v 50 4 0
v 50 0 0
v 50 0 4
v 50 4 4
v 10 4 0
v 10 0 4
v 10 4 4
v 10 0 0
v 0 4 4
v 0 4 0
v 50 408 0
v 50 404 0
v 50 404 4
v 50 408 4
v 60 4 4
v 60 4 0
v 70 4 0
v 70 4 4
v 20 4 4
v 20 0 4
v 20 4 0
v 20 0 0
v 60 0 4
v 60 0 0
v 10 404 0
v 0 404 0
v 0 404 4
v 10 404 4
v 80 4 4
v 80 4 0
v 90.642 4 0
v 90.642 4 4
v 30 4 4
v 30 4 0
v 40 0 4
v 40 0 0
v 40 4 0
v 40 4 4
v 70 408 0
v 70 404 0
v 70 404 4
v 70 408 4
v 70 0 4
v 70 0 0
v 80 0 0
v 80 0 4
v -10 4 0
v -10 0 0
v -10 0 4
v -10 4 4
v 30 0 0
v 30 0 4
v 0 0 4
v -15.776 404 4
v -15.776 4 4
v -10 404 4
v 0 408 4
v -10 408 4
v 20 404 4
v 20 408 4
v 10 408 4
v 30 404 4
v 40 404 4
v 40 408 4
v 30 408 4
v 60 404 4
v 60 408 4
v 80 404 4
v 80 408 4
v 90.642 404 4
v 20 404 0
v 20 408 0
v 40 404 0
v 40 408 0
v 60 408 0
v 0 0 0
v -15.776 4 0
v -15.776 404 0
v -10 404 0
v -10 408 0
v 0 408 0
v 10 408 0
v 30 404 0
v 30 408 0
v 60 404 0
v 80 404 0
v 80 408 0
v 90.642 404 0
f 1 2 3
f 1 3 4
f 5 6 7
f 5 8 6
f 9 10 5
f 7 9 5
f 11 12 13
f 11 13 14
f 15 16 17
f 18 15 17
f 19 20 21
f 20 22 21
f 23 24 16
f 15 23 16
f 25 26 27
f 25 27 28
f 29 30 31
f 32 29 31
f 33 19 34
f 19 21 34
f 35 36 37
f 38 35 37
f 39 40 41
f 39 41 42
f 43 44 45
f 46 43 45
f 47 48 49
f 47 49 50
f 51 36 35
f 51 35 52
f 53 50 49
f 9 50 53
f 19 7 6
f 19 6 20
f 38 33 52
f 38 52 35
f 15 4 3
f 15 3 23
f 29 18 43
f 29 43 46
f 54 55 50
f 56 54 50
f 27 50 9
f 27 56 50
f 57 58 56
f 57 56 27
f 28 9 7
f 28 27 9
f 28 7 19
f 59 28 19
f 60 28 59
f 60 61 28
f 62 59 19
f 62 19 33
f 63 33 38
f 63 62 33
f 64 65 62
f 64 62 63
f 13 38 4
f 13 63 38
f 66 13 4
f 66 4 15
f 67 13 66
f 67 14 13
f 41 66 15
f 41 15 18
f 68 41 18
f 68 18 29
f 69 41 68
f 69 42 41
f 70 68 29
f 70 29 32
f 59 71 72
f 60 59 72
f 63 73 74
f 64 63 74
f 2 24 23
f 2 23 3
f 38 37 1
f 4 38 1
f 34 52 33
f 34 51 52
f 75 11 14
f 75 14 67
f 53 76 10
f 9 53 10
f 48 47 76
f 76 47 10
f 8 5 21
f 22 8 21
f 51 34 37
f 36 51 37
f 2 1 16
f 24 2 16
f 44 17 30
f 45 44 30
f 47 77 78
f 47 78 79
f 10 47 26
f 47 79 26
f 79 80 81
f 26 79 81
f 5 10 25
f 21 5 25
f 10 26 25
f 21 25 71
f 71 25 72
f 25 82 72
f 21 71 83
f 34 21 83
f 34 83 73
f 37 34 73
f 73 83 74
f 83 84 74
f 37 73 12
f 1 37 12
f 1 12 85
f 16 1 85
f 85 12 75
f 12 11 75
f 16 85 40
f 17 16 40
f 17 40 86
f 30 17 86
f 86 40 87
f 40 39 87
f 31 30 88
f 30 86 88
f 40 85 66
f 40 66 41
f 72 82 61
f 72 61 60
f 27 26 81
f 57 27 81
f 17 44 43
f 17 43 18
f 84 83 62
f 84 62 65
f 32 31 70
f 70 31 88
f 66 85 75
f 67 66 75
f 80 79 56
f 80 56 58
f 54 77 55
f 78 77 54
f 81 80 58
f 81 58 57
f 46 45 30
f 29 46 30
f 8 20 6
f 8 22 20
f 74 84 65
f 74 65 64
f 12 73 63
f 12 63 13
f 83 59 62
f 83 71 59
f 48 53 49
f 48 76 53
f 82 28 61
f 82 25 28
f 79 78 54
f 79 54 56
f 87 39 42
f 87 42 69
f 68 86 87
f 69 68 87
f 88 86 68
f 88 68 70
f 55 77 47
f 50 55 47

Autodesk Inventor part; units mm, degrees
ref_plane "YZ Plane" through (0, 0, 0) normal (1, 0, 0) x (0, 1, 0)
ref_plane "XZ Plane" through (0, 0, 0) normal (0, 1, 0) x (-1, 0, 0)
ref_plane "XY Plane" through (0, 0, 0) normal (0, 0, 1) x (1, 0, 0)
sketch "Эскиз1" plane through (0, 0, 0) normal (0, 0, 1) x (1, 0, 0)
  line L0 (-15.776, 404) -> (-10, 404) projected
  line L1 (0, 404) -> (-10, 404) projected
  line L2 (0, 404) -> (0, 408) projected
  line L3 (-10, 408) -> (0, 408) projected
  line L4 (-10, 404) -> (-10, 408) projected
  line L5 (20, 404) -> (10, 404) projected
  line L6 (20, 404) -> (20, 408) projected
  line L7 (10, 408) -> (20, 408) projected
  line L8 (10, 404) -> (10, 408) projected
  line L9 (0, 404) -> (10, 404) projected
  line L10 (20, 404) -> (30, 404) projected
  line L11 (40, 404) -> (30, 404) projected
  line L12 (40, 404) -> (40, 408) projected
  line L13 (30, 408) -> (40, 408) projected
  line L14 (30, 404) -> (30, 408) projected
  line L15 (40, 404) -> (50, 404) projected
  line L16 (60, 404) -> (50, 404) projected
  line L17 (60, 404) -> (60, 408) projected
  line L18 (50, 408) -> (60, 408) projected
  line L19 (50, 404) -> (50, 408) projected
  line L20 (60, 404) -> (70, 404) projected
  line L21 (70, 404) -> (80, 404) projected
  line L22 (80, 404) -> (80, 408) projected
  line L23 (70, 408) -> (80, 408) projected
  line L24 (70, 404) -> (70, 408) projected
  line L25 (80, 404) -> (90.6418, 404) projected
  line L26 (-15.776, 4) -> (-10, 4) projected
  line L27 (0, 0) -> (-10, 0) projected
  line L28 (0, 0) -> (0, 4) projected
  line L29 (-10, 4) -> (0, 4) projected
  line L30 (-10, 0) -> (-10, 4) projected
  line L31 (0, 4) -> (10, 4) projected
  line L32 (20, 0) -> (10, 0) projected
  line L33 (20, 0) -> (20, 4) projected
  line L34 (10, 4) -> (20, 4) projected
  line L35 (10, 0) -> (10, 4) projected
  line L36 (20, 4) -> (30, 4) projected
  line L37 (40, 0) -> (30, 0) projected
  line L38 (40, 0) -> (40, 4) projected
  line L39 (30, 4) -> (40, 4) projected
  line L40 (30, 0) -> (30, 4) projected
  line L41 (60, 0) -> (50, 0) projected
  line L42 (60, 0) -> (60, 4) projected
  line L43 (50, 4) -> (60, 4) projected
  line L44 (50, 0) -> (50, 4) projected
  line L45 (40, 4) -> (50, 4) projected
  line L46 (60, 4) -> (70, 4) projected
  line L47 (70, 0) -> (80, 0) projected
  line L48 (80, 0) -> (80, 4) projected
  line L49 (70, 4) -> (80, 4) projected
  line L50 (70, 0) -> (70, 4) projected
  line L51 (80, 4) -> (90.6418, 4) projected
  line L52 (90.6418, 4) -> (90.6418, 404)
  line L53 (-15.776, 404) -> (-10, 404) projected
  line L54 (-15.776, 4) -> (-15.776, 404)
extrude "Выдавливание1" add sketch "Эскиз1" along normal blind 4
properties part number "верх"
